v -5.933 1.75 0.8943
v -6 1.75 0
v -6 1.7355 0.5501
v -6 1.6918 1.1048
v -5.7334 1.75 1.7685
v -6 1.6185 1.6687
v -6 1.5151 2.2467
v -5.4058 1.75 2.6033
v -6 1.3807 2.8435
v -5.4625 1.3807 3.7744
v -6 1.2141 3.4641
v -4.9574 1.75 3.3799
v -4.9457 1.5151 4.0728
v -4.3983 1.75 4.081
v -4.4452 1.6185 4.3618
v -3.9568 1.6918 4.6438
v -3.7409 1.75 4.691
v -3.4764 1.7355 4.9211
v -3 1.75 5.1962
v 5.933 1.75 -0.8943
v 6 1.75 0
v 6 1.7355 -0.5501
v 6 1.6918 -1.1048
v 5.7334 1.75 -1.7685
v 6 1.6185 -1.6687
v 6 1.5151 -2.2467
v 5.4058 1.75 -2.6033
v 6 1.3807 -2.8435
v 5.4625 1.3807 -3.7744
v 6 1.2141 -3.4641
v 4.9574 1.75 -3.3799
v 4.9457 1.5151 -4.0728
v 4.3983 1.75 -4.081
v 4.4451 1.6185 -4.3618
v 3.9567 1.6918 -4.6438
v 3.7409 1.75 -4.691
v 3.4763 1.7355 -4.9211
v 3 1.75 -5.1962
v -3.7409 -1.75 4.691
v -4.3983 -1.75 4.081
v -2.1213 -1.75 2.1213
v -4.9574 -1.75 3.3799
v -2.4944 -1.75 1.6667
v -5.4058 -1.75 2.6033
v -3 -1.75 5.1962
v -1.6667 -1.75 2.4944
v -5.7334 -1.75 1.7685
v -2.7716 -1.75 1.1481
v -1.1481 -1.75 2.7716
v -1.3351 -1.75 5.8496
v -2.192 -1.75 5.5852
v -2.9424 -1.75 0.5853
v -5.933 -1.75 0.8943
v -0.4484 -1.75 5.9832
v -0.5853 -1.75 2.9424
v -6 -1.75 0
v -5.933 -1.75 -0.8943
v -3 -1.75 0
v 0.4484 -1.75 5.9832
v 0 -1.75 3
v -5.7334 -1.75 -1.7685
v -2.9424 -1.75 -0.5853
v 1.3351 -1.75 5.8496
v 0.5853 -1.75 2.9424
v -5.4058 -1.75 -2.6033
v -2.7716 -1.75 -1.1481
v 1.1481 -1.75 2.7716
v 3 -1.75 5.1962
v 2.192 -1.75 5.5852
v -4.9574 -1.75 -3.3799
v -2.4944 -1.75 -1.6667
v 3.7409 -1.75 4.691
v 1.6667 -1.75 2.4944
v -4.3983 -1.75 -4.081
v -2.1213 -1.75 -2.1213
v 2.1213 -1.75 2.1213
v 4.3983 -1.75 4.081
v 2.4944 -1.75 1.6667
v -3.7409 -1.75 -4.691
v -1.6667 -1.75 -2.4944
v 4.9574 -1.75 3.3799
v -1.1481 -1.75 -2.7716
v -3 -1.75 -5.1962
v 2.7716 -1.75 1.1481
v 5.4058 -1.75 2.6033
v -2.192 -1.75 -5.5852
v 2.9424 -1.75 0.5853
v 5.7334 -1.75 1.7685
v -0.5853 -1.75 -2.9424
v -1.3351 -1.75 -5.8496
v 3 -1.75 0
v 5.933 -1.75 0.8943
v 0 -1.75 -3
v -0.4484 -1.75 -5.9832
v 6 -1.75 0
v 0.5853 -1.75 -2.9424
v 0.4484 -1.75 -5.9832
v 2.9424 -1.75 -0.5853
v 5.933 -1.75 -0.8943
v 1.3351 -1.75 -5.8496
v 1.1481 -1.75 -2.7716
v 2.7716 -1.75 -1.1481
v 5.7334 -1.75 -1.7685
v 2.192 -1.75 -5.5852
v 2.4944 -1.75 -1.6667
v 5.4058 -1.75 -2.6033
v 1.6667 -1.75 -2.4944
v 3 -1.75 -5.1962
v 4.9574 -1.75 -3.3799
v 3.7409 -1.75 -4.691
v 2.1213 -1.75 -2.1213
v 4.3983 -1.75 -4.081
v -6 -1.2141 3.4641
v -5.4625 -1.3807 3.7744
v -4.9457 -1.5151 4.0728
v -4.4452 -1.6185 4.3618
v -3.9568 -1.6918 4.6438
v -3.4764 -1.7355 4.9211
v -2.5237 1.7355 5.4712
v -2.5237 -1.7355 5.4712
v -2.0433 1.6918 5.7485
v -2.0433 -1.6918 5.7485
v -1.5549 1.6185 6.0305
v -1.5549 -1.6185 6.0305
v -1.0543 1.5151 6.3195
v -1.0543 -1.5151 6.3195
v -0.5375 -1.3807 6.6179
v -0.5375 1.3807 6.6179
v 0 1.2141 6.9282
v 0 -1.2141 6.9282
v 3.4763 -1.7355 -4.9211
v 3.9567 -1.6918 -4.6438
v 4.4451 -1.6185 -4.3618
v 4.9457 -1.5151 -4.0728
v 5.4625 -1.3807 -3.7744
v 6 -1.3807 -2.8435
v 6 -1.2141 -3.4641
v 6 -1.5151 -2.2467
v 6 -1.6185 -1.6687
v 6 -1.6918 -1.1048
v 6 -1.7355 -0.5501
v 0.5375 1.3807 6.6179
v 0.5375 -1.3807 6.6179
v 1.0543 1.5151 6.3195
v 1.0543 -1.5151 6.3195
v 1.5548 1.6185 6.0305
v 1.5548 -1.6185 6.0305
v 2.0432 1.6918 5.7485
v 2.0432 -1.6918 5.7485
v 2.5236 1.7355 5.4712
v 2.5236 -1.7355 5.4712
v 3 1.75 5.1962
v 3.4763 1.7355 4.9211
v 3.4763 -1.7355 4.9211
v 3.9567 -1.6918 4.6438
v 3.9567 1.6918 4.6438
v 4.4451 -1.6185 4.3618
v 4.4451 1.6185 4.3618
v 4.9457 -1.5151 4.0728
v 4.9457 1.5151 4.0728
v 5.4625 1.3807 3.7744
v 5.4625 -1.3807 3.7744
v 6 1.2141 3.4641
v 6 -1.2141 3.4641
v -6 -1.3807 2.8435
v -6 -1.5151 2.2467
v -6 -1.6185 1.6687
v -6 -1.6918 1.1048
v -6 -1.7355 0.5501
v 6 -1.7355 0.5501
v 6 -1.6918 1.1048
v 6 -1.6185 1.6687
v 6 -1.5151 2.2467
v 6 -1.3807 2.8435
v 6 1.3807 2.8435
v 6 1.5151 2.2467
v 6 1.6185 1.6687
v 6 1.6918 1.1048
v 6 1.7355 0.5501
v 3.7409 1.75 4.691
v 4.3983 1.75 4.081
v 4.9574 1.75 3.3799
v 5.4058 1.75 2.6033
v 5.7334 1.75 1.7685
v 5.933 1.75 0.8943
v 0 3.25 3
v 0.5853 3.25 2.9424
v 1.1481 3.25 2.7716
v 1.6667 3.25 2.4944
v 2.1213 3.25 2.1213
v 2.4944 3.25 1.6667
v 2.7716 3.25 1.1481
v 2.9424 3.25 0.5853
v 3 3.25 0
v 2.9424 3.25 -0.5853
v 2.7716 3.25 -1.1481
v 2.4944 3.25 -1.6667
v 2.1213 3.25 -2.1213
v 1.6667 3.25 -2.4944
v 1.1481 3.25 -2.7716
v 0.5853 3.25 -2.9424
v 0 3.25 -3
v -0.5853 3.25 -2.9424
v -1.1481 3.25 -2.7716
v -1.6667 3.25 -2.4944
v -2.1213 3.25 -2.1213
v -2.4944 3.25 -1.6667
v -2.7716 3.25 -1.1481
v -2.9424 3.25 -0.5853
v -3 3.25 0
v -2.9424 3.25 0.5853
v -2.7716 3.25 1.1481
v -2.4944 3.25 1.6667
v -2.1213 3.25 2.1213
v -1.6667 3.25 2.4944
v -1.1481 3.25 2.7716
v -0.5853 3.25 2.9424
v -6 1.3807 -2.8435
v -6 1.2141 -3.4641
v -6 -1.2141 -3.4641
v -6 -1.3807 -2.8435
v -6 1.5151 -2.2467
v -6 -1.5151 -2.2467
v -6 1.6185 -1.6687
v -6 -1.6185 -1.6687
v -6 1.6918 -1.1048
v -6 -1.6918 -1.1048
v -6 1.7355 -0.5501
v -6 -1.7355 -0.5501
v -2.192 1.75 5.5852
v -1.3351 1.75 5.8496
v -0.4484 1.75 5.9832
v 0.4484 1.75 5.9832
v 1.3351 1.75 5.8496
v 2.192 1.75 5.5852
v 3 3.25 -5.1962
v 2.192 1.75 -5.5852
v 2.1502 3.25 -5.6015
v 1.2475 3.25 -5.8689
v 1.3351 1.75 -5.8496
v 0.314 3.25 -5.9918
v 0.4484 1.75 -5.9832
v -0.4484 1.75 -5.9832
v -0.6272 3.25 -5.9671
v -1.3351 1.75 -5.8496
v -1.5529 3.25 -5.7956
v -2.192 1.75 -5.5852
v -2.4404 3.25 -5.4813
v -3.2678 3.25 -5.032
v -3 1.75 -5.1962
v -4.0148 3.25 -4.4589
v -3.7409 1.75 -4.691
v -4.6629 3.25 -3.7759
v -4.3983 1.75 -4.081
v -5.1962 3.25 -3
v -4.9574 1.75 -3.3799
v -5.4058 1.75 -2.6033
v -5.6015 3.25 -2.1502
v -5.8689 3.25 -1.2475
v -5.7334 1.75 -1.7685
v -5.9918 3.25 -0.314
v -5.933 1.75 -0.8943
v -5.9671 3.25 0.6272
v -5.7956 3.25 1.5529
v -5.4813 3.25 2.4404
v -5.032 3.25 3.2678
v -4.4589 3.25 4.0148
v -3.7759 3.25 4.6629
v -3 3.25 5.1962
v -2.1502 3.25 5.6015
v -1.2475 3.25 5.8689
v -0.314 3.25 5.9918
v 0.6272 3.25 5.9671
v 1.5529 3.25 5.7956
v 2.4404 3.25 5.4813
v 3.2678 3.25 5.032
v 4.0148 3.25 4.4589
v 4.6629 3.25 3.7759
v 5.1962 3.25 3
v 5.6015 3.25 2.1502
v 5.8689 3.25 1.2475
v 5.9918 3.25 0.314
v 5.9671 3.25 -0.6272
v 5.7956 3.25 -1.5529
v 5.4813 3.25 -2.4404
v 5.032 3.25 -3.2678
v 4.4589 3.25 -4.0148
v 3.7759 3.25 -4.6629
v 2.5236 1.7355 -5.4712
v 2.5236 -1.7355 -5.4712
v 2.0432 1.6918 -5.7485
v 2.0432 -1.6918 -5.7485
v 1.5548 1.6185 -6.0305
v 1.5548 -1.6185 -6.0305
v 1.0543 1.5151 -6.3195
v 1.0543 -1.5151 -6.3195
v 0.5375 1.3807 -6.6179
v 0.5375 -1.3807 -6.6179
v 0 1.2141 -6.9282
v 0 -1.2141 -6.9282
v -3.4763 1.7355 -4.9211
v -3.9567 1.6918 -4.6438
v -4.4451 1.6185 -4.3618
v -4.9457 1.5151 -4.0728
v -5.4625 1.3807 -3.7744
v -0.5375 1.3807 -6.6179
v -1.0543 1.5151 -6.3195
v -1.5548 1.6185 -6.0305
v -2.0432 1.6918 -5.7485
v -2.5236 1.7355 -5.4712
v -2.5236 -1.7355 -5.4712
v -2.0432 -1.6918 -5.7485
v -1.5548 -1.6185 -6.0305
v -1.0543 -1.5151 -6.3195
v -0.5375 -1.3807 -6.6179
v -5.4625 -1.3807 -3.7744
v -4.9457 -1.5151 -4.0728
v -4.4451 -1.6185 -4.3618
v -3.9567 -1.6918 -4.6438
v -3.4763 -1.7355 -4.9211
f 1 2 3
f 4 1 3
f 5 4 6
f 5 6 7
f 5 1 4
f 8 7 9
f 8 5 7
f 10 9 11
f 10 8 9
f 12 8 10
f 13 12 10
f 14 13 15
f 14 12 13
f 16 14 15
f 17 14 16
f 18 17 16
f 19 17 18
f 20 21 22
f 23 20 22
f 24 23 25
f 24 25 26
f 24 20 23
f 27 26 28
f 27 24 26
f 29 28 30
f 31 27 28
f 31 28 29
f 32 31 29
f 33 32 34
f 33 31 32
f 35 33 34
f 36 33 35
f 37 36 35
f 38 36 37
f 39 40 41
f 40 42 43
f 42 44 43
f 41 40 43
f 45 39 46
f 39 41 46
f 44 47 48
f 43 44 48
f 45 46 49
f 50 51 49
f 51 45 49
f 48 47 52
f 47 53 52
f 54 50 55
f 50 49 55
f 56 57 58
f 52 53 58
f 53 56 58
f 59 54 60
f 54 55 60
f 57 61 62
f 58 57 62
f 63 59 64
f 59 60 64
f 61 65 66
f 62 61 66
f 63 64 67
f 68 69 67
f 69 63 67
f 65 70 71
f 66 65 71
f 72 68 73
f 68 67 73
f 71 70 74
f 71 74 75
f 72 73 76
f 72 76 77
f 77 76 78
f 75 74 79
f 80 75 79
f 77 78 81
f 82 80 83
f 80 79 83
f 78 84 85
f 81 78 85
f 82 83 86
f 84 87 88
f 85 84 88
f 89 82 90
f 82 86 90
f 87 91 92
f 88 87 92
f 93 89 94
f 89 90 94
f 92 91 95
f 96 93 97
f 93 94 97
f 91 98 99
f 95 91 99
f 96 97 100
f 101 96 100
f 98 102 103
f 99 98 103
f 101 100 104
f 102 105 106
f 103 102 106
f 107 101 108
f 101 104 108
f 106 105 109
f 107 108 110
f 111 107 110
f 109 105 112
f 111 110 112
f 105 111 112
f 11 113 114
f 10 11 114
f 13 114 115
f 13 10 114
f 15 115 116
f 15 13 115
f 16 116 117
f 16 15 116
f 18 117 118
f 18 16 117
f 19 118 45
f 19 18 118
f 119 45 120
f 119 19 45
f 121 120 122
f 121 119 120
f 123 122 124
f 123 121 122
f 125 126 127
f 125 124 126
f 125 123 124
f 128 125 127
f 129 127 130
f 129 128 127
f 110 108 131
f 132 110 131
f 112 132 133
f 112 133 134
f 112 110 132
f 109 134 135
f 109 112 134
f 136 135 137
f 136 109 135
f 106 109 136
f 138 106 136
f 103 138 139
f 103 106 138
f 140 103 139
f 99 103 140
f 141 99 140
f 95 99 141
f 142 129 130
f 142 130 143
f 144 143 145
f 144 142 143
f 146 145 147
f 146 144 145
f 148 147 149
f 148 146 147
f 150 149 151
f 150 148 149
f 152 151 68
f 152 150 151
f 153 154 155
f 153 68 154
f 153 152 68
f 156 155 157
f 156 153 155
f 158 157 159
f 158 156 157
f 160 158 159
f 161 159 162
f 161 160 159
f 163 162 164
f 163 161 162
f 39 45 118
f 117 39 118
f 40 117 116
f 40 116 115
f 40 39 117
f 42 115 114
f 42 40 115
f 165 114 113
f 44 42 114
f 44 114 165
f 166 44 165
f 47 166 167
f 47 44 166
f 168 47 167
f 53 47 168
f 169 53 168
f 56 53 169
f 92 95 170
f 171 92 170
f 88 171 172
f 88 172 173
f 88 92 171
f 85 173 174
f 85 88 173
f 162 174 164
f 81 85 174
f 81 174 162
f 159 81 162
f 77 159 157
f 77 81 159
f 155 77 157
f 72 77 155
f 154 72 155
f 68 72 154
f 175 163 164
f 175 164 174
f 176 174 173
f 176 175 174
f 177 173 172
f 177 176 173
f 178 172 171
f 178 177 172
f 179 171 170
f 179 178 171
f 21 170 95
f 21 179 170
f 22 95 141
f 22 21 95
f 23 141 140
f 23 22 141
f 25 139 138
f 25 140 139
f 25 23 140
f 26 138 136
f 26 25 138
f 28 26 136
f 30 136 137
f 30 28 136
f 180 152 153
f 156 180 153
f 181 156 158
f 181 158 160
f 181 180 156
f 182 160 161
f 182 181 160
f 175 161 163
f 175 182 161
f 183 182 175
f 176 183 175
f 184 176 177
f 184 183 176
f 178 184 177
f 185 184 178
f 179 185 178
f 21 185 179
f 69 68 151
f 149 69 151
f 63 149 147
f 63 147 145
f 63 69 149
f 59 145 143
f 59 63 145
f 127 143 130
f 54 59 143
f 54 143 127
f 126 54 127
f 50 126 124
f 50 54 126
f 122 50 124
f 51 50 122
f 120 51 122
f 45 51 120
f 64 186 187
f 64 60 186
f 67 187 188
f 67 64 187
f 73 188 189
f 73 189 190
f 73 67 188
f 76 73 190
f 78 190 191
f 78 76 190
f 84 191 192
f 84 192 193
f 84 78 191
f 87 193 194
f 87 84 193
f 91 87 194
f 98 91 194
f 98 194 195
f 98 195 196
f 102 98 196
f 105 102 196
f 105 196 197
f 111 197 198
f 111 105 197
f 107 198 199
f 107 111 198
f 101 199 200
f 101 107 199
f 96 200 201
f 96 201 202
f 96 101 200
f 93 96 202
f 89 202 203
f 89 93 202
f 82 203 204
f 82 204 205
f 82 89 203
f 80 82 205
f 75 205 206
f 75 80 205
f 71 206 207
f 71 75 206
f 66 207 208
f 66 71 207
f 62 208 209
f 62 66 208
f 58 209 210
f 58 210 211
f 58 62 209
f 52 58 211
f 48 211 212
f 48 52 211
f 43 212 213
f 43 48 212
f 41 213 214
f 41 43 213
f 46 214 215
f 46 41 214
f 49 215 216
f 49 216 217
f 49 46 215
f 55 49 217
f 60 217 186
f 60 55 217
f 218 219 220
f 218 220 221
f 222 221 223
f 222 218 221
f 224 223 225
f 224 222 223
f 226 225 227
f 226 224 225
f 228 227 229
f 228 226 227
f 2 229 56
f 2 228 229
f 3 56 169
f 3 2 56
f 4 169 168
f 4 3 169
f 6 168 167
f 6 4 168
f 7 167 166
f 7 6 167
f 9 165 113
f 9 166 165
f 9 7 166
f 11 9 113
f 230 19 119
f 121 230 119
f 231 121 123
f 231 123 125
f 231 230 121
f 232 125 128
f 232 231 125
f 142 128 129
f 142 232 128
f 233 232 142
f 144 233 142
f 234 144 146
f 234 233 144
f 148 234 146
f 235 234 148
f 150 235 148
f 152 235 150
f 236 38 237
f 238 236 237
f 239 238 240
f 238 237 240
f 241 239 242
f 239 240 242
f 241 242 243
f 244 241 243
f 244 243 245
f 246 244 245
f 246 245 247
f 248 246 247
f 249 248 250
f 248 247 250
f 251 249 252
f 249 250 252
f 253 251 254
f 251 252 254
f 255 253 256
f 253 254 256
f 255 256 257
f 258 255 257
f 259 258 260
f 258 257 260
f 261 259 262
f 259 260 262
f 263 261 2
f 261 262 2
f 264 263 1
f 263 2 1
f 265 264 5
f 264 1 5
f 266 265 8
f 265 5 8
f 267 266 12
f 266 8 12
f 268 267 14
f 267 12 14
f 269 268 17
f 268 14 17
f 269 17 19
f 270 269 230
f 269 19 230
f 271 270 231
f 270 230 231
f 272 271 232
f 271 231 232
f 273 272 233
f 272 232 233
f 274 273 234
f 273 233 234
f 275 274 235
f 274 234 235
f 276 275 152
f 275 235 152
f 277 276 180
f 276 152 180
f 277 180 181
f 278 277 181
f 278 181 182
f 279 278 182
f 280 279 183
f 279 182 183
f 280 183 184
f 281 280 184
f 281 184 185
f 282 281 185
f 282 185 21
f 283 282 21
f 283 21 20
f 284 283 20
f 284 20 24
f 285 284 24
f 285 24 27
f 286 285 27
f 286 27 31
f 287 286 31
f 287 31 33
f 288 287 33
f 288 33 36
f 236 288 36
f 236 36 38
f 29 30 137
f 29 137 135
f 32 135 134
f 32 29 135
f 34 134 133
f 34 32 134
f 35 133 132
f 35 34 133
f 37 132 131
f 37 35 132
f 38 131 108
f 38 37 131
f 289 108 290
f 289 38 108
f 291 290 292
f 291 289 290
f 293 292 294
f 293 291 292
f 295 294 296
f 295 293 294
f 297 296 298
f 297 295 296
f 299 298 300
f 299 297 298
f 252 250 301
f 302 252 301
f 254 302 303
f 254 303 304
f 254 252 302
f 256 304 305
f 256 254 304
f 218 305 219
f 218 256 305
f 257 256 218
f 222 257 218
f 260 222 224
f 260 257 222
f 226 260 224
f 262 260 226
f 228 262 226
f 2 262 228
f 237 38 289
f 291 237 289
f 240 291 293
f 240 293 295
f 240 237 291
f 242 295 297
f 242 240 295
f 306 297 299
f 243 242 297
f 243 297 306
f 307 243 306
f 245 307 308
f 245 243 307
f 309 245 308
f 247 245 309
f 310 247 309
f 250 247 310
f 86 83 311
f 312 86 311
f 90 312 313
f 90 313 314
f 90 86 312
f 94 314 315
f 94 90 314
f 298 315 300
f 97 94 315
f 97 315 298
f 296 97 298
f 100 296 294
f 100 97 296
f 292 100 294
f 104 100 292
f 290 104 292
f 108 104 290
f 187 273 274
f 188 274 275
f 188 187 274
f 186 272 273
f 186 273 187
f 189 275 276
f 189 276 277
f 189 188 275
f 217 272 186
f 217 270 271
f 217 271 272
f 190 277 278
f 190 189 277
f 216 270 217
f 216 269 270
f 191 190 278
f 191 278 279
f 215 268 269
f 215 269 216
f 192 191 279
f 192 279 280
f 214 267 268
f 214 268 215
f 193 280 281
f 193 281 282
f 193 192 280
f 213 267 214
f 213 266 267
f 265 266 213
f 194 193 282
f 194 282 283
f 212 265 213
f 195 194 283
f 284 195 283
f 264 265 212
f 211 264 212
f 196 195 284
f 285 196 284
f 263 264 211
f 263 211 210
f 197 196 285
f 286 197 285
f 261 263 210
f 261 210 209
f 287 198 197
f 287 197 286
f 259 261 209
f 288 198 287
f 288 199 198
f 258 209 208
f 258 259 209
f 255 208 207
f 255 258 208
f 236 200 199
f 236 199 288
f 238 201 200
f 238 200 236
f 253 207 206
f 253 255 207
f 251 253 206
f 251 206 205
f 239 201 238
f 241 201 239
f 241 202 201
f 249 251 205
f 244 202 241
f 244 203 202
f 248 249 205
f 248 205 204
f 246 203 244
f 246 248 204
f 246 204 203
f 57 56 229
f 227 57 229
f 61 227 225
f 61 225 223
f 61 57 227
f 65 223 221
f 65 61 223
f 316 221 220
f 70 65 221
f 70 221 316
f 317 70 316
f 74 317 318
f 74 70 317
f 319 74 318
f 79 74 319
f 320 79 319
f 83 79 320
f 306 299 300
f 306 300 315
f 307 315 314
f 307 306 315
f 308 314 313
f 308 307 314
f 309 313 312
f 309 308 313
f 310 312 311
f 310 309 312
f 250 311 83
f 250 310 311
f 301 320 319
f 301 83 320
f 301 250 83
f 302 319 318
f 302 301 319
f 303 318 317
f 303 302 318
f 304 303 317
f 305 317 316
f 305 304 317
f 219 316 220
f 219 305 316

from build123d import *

# Parameters (mm, degrees)
BODYS_R             = 3
BODY_DEPTH          = 1.75
CHAMFERS_OUTSIDE_W  = 55.182
CHAMFERS_OUTSIDE_H  = 57.038
CHAMFERS_OUTSIDE_R  = 6
CHAMFER_2_DEPTH     = 10.810708435
CHAMFER_2_DRAFT     = -60
CM_COPY_1_SKETCH_W  = 55.182
CM_COPY_1_SKETCH_H  = 57.038
CM_COPY_1_SKETCH_R  = 6
CM_COPY_1_DEPTH     = 10.810708435
CM_COPY_1_DRAFT     = -60
FASTENINGBASES_R    = 6
FASTENINGBASES_R_2  = 3
FASTENINGBASE_DEPTH = 1.5


with BuildPart() as part:
    # BodyS → Body (new, symmetric)
    with BuildSketch(Plane(origin=(0, 0, 0), x_dir=(1, 0, 0), z_dir=(0, 1, 0))):
        Polygon((-6, 3.464101615), (-6, -3.464101615), (0, -6.92820323), (6, -3.464101615), (6, 3.464101615), (0, 6.92820323), align=None)
        with Locations(Location((0, 0, 0), (0, 0, 270))):
            Circle(BODYS_R, mode=Mode.SUBTRACT)
    extrude(amount=BODY_DEPTH, both=True)


with BuildPart() as chamfer_2_tool:
    # ChamferS outside → Chamfer 2 (with draft: the straight prism first)
    with BuildSketch(Plane(origin=(0, 1.75, 0), x_dir=(1, 0, 0), z_dir=(0, 1, 0))):
        Rectangle(CHAMFERS_OUTSIDE_W, CHAMFERS_OUTSIDE_H)
        Circle(CHAMFERS_OUTSIDE_R, mode=Mode.SUBTRACT)
    extrude(amount=-CHAMFER_2_DEPTH)
    # Chamfer 2: the draft: its side faces are tilted about the plane it starts from
    chamfer_2_sides = [chamfer_2_tool.faces().sort_by_distance(p)[0] for p in [
        (0, -3.655354218, 28.519),
        (27.591, -3.655354218, 0),
        (0, -3.655354218, -28.519),
        (-27.591, -3.655354218, 0),
        (-6, -3.655354218, 0),
    ]]
    draft(chamfer_2_sides, Plane(origin=(0, 1.75, 0), x_dir=(1, 0, 0), z_dir=(0, 1, 0)), CHAMFER_2_DRAFT)


with BuildPart() as part_1:
    add(part.part)

    # Chamfer 2: cut by chamfer_2_tool
    add(chamfer_2_tool.part, mode=Mode.SUBTRACT)


with BuildPart() as cm_copy_1_tool:
    # CM copy 1 sketch → CM copy 1 (with draft: the straight prism first)
    with BuildSketch(Plane.XZ.offset(1.75)):
        Rectangle(CM_COPY_1_SKETCH_W, CM_COPY_1_SKETCH_H)
        Circle(CM_COPY_1_SKETCH_R, mode=Mode.SUBTRACT)
    extrude(amount=-CM_COPY_1_DEPTH)
    # CM copy 1: the draft: its side faces are tilted about the plane it starts from
    cm_copy_1_sides = [cm_copy_1_tool.faces().sort_by_distance(p)[0] for p in [
        (0, 3.655354218, 28.519),
        (27.591, 3.655354218, 0),
        (0, 3.655354218, -28.519),
        (-27.591, 3.655354218, 0),
        (-6, 3.655354218, 0),
    ]]
    draft(cm_copy_1_sides, Plane.XZ.offset(1.75), CM_COPY_1_DRAFT)


with BuildPart() as part_2:
    add(part_1.part)

    # CM copy 1: cut by cm_copy_1_tool
    add(cm_copy_1_tool.part, mode=Mode.SUBTRACT)

    # FasteningBaseS → FasteningBase (add)
    with BuildSketch(Plane(origin=(0, 1.75, 0), x_dir=(1, 0, 0), z_dir=(0, 1, 0))):
        with Locations(Location((0, 0, 0), (0, 0, 60))):
            Circle(FASTENINGBASES_R)
        with Locations(Location((0, 0, 0), (0, 0, 270))):
            Circle(FASTENINGBASES_R_2, mode=Mode.SUBTRACT)
    extrude(amount=FASTENINGBASE_DEPTH)


solid = part_2.part
